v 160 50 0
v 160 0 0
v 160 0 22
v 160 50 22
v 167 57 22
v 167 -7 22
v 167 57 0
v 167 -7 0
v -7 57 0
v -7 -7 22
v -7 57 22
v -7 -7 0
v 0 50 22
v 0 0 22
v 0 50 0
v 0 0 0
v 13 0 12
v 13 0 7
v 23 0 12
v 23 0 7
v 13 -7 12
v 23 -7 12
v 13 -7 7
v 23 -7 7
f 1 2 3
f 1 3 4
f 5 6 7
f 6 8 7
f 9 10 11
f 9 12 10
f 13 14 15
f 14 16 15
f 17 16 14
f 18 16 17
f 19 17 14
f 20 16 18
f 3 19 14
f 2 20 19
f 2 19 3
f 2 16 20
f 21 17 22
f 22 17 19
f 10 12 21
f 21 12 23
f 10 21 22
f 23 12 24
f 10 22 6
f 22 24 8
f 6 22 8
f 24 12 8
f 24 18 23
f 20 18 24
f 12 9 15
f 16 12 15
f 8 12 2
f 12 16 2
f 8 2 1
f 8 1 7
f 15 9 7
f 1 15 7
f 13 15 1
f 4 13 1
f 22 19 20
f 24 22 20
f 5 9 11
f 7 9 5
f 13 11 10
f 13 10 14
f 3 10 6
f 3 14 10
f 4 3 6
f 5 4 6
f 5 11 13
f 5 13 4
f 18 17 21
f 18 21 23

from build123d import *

# Parameters (mm, degrees)
SKICA1_W                 = 174
SKICA1_H                 = 64
SKICA1_W_2               = 160
SKICA1_H_2               = 50
P_IDAT_VYSUNUT_M1_DEPTH  = 2
SKICA2_W                 = 174
SKICA2_H                 = 64
SKICA2_W_2               = 160
SKICA2_H_2               = 50
P_IDAT_VYSUNUT_M2_DEPTH  = 20
SKICA3_W                 = 10
SKICA3_H                 = 5
ODEBRAT_VYSUNUT_M1_DEPTH = 178.825757414


with BuildPart() as part:
    # Skica1 → Přidat vysunutím1 (new body)
    with BuildSketch(Plane.XY):
        with Locations((80, 25)):
            Rectangle(SKICA1_W, SKICA1_H)
        with Locations((80, 25)):
            Rectangle(SKICA1_W_2, SKICA1_H_2, mode=Mode.SUBTRACT)
    extrude(amount=P_IDAT_VYSUNUT_M1_DEPTH)

    # Skica2 → Přidat vysunutím2 (add)
    with BuildSketch(Plane.XY.offset(2)):
        with Locations((80, 25)):
            Rectangle(SKICA2_W, SKICA2_H)
        with Locations((80, 25)):
            Rectangle(SKICA2_W_2, SKICA2_H_2, mode=Mode.SUBTRACT)
    extrude(amount=P_IDAT_VYSUNUT_M2_DEPTH)

    # Skica3 → Odebrat vysunutím1 (cut, through all)
    with BuildSketch(Plane(origin=(0, 0, 0), x_dir=(1, 0, 0), z_dir=(0, 1, 0))):
        with Locations((18, -9.5)):
            Rectangle(SKICA3_W, SKICA3_H)
    extrude(amount=-ODEBRAT_VYSUNUT_M1_DEPTH, mode=Mode.SUBTRACT)


solid = part.part
